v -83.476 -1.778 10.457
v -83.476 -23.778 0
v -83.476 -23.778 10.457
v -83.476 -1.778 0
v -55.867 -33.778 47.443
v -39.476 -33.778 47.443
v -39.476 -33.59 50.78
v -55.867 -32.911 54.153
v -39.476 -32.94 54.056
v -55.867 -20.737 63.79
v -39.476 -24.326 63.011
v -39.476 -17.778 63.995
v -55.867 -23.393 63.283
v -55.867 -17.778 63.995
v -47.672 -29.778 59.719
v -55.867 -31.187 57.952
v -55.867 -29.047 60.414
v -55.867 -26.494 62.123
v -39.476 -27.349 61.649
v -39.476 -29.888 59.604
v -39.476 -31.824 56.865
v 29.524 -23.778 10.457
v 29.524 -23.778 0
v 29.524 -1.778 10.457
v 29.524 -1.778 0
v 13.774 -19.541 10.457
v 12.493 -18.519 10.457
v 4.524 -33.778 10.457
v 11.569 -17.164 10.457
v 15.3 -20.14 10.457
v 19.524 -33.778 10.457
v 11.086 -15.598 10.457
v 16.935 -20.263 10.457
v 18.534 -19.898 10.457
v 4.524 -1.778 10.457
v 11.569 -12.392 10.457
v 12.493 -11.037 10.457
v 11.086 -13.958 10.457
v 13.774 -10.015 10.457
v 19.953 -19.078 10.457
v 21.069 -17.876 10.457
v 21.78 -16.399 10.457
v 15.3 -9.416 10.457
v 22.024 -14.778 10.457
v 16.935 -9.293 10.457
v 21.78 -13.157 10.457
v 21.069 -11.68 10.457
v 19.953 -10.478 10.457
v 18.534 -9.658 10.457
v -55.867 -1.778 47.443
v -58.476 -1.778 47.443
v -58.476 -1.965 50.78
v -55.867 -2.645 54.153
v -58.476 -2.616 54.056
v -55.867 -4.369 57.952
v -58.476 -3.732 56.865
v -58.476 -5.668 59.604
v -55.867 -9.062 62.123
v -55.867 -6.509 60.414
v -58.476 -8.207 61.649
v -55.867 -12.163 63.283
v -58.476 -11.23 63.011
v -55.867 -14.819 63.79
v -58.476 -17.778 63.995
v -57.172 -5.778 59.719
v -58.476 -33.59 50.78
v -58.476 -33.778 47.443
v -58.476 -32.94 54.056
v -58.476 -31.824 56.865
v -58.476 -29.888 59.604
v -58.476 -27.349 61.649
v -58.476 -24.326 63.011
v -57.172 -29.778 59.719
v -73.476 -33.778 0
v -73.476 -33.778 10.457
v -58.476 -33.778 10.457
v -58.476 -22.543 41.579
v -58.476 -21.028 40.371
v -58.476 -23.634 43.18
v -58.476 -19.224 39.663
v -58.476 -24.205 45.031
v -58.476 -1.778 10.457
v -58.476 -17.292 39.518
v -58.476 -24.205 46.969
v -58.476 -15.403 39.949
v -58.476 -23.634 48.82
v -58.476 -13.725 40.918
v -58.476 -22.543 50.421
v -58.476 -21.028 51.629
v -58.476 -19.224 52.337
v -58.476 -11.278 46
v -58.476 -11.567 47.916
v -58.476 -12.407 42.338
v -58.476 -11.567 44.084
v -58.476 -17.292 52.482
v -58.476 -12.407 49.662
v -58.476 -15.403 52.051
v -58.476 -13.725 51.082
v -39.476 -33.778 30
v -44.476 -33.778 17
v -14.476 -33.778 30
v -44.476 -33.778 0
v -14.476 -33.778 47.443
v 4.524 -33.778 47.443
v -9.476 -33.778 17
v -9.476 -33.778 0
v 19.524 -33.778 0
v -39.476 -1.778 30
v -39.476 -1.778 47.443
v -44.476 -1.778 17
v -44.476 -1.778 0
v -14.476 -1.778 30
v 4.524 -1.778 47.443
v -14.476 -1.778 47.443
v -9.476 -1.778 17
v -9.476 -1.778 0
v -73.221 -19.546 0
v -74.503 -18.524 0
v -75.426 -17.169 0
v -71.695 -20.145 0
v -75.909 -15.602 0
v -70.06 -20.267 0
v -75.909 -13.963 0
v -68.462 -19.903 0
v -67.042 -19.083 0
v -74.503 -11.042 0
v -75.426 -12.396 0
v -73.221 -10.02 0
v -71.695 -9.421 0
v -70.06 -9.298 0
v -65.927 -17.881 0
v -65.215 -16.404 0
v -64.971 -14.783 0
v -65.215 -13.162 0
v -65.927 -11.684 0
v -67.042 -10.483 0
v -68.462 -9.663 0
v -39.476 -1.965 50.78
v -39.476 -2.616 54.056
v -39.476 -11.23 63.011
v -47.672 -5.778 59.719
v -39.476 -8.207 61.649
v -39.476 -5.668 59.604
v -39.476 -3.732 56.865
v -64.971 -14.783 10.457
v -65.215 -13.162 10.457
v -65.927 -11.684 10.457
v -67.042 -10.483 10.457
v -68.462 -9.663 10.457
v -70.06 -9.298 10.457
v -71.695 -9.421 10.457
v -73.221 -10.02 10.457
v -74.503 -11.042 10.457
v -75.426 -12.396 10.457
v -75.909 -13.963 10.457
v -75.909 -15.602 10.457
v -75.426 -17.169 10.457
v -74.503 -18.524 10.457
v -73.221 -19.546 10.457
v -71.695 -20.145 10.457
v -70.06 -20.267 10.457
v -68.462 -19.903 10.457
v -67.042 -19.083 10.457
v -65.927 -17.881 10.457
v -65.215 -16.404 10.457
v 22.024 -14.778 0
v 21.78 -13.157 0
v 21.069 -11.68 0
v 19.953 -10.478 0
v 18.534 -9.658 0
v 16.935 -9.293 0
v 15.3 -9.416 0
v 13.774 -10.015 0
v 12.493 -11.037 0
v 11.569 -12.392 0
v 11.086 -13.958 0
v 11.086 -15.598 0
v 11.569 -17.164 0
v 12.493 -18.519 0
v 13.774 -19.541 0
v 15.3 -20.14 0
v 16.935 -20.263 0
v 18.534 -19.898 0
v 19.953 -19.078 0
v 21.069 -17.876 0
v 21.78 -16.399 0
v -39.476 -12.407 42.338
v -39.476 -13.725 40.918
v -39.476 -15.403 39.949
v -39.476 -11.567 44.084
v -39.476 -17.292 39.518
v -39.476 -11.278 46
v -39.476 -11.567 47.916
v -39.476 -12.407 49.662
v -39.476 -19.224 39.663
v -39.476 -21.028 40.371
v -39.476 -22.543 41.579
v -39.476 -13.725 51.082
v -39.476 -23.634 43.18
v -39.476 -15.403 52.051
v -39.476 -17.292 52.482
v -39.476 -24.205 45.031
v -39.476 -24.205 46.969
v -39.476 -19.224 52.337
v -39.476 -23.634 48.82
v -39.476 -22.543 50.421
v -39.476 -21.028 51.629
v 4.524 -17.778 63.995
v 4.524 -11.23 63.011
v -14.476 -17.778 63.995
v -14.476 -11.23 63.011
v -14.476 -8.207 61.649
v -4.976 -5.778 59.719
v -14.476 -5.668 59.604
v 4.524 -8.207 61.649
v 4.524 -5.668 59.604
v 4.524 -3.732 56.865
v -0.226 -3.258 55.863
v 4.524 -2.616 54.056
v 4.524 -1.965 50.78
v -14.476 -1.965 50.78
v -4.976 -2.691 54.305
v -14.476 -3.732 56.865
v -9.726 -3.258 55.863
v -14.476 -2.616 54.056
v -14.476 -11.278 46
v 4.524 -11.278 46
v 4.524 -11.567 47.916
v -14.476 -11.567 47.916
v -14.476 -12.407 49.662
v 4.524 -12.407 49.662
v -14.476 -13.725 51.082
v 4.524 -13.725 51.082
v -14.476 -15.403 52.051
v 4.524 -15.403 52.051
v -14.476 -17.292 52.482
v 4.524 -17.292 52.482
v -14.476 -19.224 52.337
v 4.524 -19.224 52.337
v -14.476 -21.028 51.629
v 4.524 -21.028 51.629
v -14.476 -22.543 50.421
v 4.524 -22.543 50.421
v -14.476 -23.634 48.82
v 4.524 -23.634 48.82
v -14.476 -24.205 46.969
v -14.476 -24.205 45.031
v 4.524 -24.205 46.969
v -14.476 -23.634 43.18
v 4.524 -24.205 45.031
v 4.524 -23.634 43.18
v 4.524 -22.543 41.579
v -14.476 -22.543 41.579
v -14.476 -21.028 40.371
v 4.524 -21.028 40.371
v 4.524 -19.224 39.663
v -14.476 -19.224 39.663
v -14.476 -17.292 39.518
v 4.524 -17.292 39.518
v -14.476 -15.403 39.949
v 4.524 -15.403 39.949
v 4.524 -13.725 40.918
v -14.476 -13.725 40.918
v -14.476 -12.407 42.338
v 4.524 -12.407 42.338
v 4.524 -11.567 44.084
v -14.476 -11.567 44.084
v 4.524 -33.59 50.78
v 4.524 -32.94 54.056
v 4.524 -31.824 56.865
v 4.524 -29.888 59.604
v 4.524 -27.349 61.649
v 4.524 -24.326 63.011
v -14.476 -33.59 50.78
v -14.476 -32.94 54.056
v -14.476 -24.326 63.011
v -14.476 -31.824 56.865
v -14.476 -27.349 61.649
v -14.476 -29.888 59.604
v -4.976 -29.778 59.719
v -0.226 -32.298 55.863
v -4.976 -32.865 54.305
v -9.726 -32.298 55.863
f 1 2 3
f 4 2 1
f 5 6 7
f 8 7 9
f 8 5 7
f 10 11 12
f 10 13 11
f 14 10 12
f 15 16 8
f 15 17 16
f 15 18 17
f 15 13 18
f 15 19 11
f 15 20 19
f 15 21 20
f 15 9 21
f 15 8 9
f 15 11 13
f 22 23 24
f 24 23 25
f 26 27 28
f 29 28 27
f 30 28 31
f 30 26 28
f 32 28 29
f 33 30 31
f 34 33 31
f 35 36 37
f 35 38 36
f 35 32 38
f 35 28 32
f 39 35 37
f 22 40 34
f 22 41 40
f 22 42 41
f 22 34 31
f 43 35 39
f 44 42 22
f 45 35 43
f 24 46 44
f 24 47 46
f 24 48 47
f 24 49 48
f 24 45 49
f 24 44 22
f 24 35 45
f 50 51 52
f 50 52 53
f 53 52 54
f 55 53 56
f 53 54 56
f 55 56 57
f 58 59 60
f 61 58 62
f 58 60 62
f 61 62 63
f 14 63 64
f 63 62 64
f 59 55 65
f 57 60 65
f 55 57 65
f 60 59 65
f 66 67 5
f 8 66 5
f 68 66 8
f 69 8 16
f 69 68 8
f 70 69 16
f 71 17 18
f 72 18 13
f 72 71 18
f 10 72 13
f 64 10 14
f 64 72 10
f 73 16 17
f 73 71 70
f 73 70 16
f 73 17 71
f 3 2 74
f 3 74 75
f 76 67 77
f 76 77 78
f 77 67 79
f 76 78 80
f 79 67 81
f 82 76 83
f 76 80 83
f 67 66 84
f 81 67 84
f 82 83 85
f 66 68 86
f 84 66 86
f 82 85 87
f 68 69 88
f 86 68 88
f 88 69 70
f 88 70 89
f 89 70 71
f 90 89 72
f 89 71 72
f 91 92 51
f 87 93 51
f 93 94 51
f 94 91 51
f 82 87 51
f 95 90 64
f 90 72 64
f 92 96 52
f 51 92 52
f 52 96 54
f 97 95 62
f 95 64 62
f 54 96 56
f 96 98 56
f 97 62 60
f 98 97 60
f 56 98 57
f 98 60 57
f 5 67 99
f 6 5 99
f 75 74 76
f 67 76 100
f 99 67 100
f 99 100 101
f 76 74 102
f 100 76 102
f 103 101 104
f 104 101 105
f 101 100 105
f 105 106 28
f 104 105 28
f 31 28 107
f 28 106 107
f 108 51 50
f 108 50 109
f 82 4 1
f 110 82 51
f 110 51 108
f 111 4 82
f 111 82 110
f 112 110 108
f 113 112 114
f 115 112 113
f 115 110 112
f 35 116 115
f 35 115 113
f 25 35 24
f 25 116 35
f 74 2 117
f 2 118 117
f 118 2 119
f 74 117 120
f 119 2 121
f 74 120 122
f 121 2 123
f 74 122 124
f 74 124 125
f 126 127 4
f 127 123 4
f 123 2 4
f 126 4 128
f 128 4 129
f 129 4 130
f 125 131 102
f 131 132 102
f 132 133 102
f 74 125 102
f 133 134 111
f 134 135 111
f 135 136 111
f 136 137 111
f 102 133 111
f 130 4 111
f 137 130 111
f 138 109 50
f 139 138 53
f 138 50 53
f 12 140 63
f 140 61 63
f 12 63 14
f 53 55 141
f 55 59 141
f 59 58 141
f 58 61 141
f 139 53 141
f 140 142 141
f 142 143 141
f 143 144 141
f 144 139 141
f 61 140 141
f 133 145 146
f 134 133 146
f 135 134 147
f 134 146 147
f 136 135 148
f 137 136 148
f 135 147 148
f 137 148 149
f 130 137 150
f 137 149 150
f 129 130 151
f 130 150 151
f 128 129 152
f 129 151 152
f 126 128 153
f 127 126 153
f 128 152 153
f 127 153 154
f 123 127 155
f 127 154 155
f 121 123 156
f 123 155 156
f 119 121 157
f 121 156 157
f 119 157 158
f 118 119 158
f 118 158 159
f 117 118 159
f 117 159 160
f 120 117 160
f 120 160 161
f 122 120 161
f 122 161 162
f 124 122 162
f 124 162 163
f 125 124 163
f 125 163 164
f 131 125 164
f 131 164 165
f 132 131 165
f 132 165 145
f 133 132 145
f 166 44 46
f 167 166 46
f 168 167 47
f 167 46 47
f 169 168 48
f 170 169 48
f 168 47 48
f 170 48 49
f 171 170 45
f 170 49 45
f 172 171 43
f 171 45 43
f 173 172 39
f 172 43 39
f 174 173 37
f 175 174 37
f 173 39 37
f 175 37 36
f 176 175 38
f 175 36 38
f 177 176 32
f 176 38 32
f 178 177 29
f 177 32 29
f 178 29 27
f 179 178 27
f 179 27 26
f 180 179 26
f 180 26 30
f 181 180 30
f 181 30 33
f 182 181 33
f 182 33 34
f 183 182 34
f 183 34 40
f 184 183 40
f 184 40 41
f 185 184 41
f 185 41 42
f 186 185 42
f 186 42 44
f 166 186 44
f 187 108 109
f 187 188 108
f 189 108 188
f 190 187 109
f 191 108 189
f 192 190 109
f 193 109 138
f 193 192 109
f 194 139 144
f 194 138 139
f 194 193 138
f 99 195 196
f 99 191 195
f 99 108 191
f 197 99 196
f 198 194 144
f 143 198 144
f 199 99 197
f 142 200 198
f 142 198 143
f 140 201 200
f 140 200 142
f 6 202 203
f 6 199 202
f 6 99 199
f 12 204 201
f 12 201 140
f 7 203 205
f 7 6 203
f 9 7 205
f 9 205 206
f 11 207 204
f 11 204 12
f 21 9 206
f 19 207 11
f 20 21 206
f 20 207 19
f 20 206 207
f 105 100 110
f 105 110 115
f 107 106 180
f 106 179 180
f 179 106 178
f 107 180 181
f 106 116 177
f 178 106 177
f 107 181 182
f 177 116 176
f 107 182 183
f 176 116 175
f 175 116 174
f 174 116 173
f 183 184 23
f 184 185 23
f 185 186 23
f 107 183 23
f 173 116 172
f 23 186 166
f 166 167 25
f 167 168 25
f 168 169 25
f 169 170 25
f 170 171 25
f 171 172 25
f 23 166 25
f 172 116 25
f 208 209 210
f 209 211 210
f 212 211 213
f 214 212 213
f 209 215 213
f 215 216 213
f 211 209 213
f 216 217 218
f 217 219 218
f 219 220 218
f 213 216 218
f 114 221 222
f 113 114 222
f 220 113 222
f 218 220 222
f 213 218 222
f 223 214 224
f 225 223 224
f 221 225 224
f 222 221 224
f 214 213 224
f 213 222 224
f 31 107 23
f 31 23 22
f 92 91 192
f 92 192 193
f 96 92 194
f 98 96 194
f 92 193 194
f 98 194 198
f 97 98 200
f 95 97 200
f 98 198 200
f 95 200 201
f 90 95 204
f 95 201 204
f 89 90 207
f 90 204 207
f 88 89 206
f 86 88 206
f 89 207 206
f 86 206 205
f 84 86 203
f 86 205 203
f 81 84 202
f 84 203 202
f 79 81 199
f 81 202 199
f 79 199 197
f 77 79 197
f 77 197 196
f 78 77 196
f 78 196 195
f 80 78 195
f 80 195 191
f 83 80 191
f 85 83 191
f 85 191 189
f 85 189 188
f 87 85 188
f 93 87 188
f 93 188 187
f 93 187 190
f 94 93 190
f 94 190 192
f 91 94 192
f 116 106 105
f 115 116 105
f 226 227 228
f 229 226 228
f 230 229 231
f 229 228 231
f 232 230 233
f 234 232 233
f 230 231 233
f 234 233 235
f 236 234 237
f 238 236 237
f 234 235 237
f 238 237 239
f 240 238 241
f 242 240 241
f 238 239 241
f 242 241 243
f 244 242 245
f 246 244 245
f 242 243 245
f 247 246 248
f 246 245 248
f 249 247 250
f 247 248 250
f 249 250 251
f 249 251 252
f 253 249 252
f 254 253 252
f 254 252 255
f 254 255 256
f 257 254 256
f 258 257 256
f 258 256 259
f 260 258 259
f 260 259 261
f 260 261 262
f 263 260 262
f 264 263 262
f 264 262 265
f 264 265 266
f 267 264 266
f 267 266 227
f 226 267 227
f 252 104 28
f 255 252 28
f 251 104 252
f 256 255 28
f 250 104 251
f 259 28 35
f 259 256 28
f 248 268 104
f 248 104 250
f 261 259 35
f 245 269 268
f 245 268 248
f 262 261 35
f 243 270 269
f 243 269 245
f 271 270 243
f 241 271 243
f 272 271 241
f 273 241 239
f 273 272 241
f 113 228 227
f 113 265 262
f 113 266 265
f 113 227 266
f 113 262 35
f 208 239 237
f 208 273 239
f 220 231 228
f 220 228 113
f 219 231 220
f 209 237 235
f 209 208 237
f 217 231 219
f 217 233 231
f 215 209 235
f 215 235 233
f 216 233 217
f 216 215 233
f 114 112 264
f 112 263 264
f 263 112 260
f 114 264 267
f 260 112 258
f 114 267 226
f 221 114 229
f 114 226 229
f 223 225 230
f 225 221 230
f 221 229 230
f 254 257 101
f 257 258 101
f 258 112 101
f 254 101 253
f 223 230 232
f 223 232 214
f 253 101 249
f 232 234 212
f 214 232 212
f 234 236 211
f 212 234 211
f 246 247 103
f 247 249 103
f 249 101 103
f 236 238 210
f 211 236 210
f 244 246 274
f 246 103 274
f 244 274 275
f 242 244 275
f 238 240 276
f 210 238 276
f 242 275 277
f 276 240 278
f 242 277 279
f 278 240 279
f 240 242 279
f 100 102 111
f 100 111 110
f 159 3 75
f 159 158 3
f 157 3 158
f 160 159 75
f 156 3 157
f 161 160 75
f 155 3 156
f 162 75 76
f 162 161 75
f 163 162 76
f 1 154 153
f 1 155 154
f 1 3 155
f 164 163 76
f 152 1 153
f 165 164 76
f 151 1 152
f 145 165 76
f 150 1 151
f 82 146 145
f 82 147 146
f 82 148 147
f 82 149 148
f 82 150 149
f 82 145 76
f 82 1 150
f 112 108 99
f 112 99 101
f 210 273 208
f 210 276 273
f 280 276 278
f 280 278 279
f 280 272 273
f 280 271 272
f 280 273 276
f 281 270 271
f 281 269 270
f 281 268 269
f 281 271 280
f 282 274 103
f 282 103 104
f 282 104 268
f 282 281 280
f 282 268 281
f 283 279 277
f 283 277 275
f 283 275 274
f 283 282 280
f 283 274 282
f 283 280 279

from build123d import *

# Parameters (mm, degrees)
F0_W         = 113
F0_H         = 32
F1_DEPTH     = 64
F2_W         = 25
F2_H         = 32
F3_DEPTH     = 53.5432
F4_W         = 35
F4_H         = 17
F5_DEPTH     = 34.544
F6_SIZE      = 10
F7_W         = 25
F7_H         = 34
F8_DEPTH     = 33.274
F9_R         = 5.5
F10_DEPTH    = 25.4
F11_R        = 6.5
F12_DEPTH    = 82.296
F13_T1_DEPTH = 101.7833830538
F13_T3_DEPTH = 101.7833830538


# Not quite as in the source:
# - a fillet or chamfer that OpenCascade refuses, or shapes differently, is made with other operations: its cross-section is extruded or revolved along the edge and cut away or added


with BuildPart() as f1:
    # F0 (on Top) → F1 (new body)
    with BuildSketch(Plane.XY):
        with Locations((-26.9756987691, -17.7779501617)):
            Rectangle(F0_W, F0_H)
    extrude(amount=F1_DEPTH)

    # F2 (on face) → F3 (cut)
    with BuildSketch(Plane.XY.offset(64)):
        with Locations((-70.9756987691, -17.7779501617)):
            Rectangle(F2_W, F2_H)
        with Locations((17.0243012309, -17.7779501617)):
            Rectangle(F2_W, F2_H)
    extrude(amount=-F3_DEPTH, mode=Mode.SUBTRACT)

    # F4 (on face) → F5 (cut)
    with BuildSketch(Plane.XZ.offset(33.7779501617)):
        with Locations((-26.9756987691, 8.5)):
            Rectangle(F4_W, F4_H)
    extrude(amount=-F5_DEPTH, mode=Mode.SUBTRACT)

    # F6
    f6_edges = [f1.edges().sort_by_distance(p)[0] for p in [
        (29.524301, -33.77795, 5.2284),
        (-83.475699, -33.77795, 5.2284),
    ]]
    chamfer(f6_edges, length=F6_SIZE)

    # F7 (on face) → F8 (cut)
    with BuildSketch(Plane.XZ.offset(33.7779501617)):
        with Locations((-26.9756987691, 47)):
            Rectangle(F7_W, F7_H)
    extrude(amount=-F8_DEPTH, mode=Mode.SUBTRACT)

    # F9 (on face) → F10 (cut)
    with BuildSketch(Plane.XY.offset(10.4568)):
        with Locations((-70.4708987691, -14.7827501617)):
            Circle(F9_R)
        with Locations((16.5243012309, -14.7779501617)):
            Circle(F9_R)
    extrude(amount=-F10_DEPTH, mode=Mode.SUBTRACT)

    # F11 (on face) → F12 (cut)
    with BuildSketch(Plane.YZ.offset(4.5243012309)):
        with Locations((-17.7779501617, 46)):
            Circle(F11_R)
    extrude(amount=-F12_DEPTH, mode=Mode.SUBTRACT)

    # F13: fillet of radius 16.5566766108 on 4 edges, made by hand

    # F13_s2 → F13_t1 (cut)
    with BuildSketch(Plane.YZ.offset(-55.867390296)):
        with BuildLine():
            add(Edge.make_bspline(
                [(-33.7779501617, 47.4433233892), (-33.7779501617, 64), (-17.2212735509, 64)],
                knots=[0, 0, 0, 1, 1, 1], degree=2, weights=[1, 1, 1]))
            Line((-17.2212735509, 64), (-33.7779501617, 64))
            Line((-33.7779501617, 64), (-33.7779501617, 47.4433233892))
        make_face()
        with BuildLine():
            add(Edge.make_bspline(
                [(-1.7779501617, 47.4433233892), (-1.7779501617, 64), (-18.3346267724, 64)],
                knots=[0, 0, 0, 1, 1, 1], degree=2, weights=[1, 1, 1]))
            Line((-18.3346267724, 64), (-1.7779501617, 64))
            Line((-1.7779501617, 64), (-1.7779501617, 47.4433233892))
        make_face()
    extrude(amount=F13_T1_DEPTH, mode=Mode.SUBTRACT)

    # F13_s4 → F13_t3 (cut)
    with BuildSketch(Plane.YZ.offset(-99.867390296)):
        with BuildLine():
            add(Edge.make_bspline(
                [(-33.7779501617, 47.4433233892), (-33.7779501617, 64), (-17.2212735509, 64)],
                knots=[0, 0, 0, 1, 1, 1], degree=2, weights=[1, 1, 1]))
            Line((-17.2212735509, 64), (-33.7779501617, 64))
            Line((-33.7779501617, 64), (-33.7779501617, 47.4433233892))
        make_face()
        with BuildLine():
            add(Edge.make_bspline(
                [(-1.7779501617, 47.4433233892), (-1.7779501617, 64), (-18.3346267724, 64)],
                knots=[0, 0, 0, 1, 1, 1], degree=2, weights=[1, 1, 1]))
            Line((-18.3346267724, 64), (-1.7779501617, 64))
            Line((-1.7779501617, 64), (-1.7779501617, 47.4433233892))
        make_face()
    extrude(amount=F13_T3_DEPTH, mode=Mode.SUBTRACT)


solid = f1.part
